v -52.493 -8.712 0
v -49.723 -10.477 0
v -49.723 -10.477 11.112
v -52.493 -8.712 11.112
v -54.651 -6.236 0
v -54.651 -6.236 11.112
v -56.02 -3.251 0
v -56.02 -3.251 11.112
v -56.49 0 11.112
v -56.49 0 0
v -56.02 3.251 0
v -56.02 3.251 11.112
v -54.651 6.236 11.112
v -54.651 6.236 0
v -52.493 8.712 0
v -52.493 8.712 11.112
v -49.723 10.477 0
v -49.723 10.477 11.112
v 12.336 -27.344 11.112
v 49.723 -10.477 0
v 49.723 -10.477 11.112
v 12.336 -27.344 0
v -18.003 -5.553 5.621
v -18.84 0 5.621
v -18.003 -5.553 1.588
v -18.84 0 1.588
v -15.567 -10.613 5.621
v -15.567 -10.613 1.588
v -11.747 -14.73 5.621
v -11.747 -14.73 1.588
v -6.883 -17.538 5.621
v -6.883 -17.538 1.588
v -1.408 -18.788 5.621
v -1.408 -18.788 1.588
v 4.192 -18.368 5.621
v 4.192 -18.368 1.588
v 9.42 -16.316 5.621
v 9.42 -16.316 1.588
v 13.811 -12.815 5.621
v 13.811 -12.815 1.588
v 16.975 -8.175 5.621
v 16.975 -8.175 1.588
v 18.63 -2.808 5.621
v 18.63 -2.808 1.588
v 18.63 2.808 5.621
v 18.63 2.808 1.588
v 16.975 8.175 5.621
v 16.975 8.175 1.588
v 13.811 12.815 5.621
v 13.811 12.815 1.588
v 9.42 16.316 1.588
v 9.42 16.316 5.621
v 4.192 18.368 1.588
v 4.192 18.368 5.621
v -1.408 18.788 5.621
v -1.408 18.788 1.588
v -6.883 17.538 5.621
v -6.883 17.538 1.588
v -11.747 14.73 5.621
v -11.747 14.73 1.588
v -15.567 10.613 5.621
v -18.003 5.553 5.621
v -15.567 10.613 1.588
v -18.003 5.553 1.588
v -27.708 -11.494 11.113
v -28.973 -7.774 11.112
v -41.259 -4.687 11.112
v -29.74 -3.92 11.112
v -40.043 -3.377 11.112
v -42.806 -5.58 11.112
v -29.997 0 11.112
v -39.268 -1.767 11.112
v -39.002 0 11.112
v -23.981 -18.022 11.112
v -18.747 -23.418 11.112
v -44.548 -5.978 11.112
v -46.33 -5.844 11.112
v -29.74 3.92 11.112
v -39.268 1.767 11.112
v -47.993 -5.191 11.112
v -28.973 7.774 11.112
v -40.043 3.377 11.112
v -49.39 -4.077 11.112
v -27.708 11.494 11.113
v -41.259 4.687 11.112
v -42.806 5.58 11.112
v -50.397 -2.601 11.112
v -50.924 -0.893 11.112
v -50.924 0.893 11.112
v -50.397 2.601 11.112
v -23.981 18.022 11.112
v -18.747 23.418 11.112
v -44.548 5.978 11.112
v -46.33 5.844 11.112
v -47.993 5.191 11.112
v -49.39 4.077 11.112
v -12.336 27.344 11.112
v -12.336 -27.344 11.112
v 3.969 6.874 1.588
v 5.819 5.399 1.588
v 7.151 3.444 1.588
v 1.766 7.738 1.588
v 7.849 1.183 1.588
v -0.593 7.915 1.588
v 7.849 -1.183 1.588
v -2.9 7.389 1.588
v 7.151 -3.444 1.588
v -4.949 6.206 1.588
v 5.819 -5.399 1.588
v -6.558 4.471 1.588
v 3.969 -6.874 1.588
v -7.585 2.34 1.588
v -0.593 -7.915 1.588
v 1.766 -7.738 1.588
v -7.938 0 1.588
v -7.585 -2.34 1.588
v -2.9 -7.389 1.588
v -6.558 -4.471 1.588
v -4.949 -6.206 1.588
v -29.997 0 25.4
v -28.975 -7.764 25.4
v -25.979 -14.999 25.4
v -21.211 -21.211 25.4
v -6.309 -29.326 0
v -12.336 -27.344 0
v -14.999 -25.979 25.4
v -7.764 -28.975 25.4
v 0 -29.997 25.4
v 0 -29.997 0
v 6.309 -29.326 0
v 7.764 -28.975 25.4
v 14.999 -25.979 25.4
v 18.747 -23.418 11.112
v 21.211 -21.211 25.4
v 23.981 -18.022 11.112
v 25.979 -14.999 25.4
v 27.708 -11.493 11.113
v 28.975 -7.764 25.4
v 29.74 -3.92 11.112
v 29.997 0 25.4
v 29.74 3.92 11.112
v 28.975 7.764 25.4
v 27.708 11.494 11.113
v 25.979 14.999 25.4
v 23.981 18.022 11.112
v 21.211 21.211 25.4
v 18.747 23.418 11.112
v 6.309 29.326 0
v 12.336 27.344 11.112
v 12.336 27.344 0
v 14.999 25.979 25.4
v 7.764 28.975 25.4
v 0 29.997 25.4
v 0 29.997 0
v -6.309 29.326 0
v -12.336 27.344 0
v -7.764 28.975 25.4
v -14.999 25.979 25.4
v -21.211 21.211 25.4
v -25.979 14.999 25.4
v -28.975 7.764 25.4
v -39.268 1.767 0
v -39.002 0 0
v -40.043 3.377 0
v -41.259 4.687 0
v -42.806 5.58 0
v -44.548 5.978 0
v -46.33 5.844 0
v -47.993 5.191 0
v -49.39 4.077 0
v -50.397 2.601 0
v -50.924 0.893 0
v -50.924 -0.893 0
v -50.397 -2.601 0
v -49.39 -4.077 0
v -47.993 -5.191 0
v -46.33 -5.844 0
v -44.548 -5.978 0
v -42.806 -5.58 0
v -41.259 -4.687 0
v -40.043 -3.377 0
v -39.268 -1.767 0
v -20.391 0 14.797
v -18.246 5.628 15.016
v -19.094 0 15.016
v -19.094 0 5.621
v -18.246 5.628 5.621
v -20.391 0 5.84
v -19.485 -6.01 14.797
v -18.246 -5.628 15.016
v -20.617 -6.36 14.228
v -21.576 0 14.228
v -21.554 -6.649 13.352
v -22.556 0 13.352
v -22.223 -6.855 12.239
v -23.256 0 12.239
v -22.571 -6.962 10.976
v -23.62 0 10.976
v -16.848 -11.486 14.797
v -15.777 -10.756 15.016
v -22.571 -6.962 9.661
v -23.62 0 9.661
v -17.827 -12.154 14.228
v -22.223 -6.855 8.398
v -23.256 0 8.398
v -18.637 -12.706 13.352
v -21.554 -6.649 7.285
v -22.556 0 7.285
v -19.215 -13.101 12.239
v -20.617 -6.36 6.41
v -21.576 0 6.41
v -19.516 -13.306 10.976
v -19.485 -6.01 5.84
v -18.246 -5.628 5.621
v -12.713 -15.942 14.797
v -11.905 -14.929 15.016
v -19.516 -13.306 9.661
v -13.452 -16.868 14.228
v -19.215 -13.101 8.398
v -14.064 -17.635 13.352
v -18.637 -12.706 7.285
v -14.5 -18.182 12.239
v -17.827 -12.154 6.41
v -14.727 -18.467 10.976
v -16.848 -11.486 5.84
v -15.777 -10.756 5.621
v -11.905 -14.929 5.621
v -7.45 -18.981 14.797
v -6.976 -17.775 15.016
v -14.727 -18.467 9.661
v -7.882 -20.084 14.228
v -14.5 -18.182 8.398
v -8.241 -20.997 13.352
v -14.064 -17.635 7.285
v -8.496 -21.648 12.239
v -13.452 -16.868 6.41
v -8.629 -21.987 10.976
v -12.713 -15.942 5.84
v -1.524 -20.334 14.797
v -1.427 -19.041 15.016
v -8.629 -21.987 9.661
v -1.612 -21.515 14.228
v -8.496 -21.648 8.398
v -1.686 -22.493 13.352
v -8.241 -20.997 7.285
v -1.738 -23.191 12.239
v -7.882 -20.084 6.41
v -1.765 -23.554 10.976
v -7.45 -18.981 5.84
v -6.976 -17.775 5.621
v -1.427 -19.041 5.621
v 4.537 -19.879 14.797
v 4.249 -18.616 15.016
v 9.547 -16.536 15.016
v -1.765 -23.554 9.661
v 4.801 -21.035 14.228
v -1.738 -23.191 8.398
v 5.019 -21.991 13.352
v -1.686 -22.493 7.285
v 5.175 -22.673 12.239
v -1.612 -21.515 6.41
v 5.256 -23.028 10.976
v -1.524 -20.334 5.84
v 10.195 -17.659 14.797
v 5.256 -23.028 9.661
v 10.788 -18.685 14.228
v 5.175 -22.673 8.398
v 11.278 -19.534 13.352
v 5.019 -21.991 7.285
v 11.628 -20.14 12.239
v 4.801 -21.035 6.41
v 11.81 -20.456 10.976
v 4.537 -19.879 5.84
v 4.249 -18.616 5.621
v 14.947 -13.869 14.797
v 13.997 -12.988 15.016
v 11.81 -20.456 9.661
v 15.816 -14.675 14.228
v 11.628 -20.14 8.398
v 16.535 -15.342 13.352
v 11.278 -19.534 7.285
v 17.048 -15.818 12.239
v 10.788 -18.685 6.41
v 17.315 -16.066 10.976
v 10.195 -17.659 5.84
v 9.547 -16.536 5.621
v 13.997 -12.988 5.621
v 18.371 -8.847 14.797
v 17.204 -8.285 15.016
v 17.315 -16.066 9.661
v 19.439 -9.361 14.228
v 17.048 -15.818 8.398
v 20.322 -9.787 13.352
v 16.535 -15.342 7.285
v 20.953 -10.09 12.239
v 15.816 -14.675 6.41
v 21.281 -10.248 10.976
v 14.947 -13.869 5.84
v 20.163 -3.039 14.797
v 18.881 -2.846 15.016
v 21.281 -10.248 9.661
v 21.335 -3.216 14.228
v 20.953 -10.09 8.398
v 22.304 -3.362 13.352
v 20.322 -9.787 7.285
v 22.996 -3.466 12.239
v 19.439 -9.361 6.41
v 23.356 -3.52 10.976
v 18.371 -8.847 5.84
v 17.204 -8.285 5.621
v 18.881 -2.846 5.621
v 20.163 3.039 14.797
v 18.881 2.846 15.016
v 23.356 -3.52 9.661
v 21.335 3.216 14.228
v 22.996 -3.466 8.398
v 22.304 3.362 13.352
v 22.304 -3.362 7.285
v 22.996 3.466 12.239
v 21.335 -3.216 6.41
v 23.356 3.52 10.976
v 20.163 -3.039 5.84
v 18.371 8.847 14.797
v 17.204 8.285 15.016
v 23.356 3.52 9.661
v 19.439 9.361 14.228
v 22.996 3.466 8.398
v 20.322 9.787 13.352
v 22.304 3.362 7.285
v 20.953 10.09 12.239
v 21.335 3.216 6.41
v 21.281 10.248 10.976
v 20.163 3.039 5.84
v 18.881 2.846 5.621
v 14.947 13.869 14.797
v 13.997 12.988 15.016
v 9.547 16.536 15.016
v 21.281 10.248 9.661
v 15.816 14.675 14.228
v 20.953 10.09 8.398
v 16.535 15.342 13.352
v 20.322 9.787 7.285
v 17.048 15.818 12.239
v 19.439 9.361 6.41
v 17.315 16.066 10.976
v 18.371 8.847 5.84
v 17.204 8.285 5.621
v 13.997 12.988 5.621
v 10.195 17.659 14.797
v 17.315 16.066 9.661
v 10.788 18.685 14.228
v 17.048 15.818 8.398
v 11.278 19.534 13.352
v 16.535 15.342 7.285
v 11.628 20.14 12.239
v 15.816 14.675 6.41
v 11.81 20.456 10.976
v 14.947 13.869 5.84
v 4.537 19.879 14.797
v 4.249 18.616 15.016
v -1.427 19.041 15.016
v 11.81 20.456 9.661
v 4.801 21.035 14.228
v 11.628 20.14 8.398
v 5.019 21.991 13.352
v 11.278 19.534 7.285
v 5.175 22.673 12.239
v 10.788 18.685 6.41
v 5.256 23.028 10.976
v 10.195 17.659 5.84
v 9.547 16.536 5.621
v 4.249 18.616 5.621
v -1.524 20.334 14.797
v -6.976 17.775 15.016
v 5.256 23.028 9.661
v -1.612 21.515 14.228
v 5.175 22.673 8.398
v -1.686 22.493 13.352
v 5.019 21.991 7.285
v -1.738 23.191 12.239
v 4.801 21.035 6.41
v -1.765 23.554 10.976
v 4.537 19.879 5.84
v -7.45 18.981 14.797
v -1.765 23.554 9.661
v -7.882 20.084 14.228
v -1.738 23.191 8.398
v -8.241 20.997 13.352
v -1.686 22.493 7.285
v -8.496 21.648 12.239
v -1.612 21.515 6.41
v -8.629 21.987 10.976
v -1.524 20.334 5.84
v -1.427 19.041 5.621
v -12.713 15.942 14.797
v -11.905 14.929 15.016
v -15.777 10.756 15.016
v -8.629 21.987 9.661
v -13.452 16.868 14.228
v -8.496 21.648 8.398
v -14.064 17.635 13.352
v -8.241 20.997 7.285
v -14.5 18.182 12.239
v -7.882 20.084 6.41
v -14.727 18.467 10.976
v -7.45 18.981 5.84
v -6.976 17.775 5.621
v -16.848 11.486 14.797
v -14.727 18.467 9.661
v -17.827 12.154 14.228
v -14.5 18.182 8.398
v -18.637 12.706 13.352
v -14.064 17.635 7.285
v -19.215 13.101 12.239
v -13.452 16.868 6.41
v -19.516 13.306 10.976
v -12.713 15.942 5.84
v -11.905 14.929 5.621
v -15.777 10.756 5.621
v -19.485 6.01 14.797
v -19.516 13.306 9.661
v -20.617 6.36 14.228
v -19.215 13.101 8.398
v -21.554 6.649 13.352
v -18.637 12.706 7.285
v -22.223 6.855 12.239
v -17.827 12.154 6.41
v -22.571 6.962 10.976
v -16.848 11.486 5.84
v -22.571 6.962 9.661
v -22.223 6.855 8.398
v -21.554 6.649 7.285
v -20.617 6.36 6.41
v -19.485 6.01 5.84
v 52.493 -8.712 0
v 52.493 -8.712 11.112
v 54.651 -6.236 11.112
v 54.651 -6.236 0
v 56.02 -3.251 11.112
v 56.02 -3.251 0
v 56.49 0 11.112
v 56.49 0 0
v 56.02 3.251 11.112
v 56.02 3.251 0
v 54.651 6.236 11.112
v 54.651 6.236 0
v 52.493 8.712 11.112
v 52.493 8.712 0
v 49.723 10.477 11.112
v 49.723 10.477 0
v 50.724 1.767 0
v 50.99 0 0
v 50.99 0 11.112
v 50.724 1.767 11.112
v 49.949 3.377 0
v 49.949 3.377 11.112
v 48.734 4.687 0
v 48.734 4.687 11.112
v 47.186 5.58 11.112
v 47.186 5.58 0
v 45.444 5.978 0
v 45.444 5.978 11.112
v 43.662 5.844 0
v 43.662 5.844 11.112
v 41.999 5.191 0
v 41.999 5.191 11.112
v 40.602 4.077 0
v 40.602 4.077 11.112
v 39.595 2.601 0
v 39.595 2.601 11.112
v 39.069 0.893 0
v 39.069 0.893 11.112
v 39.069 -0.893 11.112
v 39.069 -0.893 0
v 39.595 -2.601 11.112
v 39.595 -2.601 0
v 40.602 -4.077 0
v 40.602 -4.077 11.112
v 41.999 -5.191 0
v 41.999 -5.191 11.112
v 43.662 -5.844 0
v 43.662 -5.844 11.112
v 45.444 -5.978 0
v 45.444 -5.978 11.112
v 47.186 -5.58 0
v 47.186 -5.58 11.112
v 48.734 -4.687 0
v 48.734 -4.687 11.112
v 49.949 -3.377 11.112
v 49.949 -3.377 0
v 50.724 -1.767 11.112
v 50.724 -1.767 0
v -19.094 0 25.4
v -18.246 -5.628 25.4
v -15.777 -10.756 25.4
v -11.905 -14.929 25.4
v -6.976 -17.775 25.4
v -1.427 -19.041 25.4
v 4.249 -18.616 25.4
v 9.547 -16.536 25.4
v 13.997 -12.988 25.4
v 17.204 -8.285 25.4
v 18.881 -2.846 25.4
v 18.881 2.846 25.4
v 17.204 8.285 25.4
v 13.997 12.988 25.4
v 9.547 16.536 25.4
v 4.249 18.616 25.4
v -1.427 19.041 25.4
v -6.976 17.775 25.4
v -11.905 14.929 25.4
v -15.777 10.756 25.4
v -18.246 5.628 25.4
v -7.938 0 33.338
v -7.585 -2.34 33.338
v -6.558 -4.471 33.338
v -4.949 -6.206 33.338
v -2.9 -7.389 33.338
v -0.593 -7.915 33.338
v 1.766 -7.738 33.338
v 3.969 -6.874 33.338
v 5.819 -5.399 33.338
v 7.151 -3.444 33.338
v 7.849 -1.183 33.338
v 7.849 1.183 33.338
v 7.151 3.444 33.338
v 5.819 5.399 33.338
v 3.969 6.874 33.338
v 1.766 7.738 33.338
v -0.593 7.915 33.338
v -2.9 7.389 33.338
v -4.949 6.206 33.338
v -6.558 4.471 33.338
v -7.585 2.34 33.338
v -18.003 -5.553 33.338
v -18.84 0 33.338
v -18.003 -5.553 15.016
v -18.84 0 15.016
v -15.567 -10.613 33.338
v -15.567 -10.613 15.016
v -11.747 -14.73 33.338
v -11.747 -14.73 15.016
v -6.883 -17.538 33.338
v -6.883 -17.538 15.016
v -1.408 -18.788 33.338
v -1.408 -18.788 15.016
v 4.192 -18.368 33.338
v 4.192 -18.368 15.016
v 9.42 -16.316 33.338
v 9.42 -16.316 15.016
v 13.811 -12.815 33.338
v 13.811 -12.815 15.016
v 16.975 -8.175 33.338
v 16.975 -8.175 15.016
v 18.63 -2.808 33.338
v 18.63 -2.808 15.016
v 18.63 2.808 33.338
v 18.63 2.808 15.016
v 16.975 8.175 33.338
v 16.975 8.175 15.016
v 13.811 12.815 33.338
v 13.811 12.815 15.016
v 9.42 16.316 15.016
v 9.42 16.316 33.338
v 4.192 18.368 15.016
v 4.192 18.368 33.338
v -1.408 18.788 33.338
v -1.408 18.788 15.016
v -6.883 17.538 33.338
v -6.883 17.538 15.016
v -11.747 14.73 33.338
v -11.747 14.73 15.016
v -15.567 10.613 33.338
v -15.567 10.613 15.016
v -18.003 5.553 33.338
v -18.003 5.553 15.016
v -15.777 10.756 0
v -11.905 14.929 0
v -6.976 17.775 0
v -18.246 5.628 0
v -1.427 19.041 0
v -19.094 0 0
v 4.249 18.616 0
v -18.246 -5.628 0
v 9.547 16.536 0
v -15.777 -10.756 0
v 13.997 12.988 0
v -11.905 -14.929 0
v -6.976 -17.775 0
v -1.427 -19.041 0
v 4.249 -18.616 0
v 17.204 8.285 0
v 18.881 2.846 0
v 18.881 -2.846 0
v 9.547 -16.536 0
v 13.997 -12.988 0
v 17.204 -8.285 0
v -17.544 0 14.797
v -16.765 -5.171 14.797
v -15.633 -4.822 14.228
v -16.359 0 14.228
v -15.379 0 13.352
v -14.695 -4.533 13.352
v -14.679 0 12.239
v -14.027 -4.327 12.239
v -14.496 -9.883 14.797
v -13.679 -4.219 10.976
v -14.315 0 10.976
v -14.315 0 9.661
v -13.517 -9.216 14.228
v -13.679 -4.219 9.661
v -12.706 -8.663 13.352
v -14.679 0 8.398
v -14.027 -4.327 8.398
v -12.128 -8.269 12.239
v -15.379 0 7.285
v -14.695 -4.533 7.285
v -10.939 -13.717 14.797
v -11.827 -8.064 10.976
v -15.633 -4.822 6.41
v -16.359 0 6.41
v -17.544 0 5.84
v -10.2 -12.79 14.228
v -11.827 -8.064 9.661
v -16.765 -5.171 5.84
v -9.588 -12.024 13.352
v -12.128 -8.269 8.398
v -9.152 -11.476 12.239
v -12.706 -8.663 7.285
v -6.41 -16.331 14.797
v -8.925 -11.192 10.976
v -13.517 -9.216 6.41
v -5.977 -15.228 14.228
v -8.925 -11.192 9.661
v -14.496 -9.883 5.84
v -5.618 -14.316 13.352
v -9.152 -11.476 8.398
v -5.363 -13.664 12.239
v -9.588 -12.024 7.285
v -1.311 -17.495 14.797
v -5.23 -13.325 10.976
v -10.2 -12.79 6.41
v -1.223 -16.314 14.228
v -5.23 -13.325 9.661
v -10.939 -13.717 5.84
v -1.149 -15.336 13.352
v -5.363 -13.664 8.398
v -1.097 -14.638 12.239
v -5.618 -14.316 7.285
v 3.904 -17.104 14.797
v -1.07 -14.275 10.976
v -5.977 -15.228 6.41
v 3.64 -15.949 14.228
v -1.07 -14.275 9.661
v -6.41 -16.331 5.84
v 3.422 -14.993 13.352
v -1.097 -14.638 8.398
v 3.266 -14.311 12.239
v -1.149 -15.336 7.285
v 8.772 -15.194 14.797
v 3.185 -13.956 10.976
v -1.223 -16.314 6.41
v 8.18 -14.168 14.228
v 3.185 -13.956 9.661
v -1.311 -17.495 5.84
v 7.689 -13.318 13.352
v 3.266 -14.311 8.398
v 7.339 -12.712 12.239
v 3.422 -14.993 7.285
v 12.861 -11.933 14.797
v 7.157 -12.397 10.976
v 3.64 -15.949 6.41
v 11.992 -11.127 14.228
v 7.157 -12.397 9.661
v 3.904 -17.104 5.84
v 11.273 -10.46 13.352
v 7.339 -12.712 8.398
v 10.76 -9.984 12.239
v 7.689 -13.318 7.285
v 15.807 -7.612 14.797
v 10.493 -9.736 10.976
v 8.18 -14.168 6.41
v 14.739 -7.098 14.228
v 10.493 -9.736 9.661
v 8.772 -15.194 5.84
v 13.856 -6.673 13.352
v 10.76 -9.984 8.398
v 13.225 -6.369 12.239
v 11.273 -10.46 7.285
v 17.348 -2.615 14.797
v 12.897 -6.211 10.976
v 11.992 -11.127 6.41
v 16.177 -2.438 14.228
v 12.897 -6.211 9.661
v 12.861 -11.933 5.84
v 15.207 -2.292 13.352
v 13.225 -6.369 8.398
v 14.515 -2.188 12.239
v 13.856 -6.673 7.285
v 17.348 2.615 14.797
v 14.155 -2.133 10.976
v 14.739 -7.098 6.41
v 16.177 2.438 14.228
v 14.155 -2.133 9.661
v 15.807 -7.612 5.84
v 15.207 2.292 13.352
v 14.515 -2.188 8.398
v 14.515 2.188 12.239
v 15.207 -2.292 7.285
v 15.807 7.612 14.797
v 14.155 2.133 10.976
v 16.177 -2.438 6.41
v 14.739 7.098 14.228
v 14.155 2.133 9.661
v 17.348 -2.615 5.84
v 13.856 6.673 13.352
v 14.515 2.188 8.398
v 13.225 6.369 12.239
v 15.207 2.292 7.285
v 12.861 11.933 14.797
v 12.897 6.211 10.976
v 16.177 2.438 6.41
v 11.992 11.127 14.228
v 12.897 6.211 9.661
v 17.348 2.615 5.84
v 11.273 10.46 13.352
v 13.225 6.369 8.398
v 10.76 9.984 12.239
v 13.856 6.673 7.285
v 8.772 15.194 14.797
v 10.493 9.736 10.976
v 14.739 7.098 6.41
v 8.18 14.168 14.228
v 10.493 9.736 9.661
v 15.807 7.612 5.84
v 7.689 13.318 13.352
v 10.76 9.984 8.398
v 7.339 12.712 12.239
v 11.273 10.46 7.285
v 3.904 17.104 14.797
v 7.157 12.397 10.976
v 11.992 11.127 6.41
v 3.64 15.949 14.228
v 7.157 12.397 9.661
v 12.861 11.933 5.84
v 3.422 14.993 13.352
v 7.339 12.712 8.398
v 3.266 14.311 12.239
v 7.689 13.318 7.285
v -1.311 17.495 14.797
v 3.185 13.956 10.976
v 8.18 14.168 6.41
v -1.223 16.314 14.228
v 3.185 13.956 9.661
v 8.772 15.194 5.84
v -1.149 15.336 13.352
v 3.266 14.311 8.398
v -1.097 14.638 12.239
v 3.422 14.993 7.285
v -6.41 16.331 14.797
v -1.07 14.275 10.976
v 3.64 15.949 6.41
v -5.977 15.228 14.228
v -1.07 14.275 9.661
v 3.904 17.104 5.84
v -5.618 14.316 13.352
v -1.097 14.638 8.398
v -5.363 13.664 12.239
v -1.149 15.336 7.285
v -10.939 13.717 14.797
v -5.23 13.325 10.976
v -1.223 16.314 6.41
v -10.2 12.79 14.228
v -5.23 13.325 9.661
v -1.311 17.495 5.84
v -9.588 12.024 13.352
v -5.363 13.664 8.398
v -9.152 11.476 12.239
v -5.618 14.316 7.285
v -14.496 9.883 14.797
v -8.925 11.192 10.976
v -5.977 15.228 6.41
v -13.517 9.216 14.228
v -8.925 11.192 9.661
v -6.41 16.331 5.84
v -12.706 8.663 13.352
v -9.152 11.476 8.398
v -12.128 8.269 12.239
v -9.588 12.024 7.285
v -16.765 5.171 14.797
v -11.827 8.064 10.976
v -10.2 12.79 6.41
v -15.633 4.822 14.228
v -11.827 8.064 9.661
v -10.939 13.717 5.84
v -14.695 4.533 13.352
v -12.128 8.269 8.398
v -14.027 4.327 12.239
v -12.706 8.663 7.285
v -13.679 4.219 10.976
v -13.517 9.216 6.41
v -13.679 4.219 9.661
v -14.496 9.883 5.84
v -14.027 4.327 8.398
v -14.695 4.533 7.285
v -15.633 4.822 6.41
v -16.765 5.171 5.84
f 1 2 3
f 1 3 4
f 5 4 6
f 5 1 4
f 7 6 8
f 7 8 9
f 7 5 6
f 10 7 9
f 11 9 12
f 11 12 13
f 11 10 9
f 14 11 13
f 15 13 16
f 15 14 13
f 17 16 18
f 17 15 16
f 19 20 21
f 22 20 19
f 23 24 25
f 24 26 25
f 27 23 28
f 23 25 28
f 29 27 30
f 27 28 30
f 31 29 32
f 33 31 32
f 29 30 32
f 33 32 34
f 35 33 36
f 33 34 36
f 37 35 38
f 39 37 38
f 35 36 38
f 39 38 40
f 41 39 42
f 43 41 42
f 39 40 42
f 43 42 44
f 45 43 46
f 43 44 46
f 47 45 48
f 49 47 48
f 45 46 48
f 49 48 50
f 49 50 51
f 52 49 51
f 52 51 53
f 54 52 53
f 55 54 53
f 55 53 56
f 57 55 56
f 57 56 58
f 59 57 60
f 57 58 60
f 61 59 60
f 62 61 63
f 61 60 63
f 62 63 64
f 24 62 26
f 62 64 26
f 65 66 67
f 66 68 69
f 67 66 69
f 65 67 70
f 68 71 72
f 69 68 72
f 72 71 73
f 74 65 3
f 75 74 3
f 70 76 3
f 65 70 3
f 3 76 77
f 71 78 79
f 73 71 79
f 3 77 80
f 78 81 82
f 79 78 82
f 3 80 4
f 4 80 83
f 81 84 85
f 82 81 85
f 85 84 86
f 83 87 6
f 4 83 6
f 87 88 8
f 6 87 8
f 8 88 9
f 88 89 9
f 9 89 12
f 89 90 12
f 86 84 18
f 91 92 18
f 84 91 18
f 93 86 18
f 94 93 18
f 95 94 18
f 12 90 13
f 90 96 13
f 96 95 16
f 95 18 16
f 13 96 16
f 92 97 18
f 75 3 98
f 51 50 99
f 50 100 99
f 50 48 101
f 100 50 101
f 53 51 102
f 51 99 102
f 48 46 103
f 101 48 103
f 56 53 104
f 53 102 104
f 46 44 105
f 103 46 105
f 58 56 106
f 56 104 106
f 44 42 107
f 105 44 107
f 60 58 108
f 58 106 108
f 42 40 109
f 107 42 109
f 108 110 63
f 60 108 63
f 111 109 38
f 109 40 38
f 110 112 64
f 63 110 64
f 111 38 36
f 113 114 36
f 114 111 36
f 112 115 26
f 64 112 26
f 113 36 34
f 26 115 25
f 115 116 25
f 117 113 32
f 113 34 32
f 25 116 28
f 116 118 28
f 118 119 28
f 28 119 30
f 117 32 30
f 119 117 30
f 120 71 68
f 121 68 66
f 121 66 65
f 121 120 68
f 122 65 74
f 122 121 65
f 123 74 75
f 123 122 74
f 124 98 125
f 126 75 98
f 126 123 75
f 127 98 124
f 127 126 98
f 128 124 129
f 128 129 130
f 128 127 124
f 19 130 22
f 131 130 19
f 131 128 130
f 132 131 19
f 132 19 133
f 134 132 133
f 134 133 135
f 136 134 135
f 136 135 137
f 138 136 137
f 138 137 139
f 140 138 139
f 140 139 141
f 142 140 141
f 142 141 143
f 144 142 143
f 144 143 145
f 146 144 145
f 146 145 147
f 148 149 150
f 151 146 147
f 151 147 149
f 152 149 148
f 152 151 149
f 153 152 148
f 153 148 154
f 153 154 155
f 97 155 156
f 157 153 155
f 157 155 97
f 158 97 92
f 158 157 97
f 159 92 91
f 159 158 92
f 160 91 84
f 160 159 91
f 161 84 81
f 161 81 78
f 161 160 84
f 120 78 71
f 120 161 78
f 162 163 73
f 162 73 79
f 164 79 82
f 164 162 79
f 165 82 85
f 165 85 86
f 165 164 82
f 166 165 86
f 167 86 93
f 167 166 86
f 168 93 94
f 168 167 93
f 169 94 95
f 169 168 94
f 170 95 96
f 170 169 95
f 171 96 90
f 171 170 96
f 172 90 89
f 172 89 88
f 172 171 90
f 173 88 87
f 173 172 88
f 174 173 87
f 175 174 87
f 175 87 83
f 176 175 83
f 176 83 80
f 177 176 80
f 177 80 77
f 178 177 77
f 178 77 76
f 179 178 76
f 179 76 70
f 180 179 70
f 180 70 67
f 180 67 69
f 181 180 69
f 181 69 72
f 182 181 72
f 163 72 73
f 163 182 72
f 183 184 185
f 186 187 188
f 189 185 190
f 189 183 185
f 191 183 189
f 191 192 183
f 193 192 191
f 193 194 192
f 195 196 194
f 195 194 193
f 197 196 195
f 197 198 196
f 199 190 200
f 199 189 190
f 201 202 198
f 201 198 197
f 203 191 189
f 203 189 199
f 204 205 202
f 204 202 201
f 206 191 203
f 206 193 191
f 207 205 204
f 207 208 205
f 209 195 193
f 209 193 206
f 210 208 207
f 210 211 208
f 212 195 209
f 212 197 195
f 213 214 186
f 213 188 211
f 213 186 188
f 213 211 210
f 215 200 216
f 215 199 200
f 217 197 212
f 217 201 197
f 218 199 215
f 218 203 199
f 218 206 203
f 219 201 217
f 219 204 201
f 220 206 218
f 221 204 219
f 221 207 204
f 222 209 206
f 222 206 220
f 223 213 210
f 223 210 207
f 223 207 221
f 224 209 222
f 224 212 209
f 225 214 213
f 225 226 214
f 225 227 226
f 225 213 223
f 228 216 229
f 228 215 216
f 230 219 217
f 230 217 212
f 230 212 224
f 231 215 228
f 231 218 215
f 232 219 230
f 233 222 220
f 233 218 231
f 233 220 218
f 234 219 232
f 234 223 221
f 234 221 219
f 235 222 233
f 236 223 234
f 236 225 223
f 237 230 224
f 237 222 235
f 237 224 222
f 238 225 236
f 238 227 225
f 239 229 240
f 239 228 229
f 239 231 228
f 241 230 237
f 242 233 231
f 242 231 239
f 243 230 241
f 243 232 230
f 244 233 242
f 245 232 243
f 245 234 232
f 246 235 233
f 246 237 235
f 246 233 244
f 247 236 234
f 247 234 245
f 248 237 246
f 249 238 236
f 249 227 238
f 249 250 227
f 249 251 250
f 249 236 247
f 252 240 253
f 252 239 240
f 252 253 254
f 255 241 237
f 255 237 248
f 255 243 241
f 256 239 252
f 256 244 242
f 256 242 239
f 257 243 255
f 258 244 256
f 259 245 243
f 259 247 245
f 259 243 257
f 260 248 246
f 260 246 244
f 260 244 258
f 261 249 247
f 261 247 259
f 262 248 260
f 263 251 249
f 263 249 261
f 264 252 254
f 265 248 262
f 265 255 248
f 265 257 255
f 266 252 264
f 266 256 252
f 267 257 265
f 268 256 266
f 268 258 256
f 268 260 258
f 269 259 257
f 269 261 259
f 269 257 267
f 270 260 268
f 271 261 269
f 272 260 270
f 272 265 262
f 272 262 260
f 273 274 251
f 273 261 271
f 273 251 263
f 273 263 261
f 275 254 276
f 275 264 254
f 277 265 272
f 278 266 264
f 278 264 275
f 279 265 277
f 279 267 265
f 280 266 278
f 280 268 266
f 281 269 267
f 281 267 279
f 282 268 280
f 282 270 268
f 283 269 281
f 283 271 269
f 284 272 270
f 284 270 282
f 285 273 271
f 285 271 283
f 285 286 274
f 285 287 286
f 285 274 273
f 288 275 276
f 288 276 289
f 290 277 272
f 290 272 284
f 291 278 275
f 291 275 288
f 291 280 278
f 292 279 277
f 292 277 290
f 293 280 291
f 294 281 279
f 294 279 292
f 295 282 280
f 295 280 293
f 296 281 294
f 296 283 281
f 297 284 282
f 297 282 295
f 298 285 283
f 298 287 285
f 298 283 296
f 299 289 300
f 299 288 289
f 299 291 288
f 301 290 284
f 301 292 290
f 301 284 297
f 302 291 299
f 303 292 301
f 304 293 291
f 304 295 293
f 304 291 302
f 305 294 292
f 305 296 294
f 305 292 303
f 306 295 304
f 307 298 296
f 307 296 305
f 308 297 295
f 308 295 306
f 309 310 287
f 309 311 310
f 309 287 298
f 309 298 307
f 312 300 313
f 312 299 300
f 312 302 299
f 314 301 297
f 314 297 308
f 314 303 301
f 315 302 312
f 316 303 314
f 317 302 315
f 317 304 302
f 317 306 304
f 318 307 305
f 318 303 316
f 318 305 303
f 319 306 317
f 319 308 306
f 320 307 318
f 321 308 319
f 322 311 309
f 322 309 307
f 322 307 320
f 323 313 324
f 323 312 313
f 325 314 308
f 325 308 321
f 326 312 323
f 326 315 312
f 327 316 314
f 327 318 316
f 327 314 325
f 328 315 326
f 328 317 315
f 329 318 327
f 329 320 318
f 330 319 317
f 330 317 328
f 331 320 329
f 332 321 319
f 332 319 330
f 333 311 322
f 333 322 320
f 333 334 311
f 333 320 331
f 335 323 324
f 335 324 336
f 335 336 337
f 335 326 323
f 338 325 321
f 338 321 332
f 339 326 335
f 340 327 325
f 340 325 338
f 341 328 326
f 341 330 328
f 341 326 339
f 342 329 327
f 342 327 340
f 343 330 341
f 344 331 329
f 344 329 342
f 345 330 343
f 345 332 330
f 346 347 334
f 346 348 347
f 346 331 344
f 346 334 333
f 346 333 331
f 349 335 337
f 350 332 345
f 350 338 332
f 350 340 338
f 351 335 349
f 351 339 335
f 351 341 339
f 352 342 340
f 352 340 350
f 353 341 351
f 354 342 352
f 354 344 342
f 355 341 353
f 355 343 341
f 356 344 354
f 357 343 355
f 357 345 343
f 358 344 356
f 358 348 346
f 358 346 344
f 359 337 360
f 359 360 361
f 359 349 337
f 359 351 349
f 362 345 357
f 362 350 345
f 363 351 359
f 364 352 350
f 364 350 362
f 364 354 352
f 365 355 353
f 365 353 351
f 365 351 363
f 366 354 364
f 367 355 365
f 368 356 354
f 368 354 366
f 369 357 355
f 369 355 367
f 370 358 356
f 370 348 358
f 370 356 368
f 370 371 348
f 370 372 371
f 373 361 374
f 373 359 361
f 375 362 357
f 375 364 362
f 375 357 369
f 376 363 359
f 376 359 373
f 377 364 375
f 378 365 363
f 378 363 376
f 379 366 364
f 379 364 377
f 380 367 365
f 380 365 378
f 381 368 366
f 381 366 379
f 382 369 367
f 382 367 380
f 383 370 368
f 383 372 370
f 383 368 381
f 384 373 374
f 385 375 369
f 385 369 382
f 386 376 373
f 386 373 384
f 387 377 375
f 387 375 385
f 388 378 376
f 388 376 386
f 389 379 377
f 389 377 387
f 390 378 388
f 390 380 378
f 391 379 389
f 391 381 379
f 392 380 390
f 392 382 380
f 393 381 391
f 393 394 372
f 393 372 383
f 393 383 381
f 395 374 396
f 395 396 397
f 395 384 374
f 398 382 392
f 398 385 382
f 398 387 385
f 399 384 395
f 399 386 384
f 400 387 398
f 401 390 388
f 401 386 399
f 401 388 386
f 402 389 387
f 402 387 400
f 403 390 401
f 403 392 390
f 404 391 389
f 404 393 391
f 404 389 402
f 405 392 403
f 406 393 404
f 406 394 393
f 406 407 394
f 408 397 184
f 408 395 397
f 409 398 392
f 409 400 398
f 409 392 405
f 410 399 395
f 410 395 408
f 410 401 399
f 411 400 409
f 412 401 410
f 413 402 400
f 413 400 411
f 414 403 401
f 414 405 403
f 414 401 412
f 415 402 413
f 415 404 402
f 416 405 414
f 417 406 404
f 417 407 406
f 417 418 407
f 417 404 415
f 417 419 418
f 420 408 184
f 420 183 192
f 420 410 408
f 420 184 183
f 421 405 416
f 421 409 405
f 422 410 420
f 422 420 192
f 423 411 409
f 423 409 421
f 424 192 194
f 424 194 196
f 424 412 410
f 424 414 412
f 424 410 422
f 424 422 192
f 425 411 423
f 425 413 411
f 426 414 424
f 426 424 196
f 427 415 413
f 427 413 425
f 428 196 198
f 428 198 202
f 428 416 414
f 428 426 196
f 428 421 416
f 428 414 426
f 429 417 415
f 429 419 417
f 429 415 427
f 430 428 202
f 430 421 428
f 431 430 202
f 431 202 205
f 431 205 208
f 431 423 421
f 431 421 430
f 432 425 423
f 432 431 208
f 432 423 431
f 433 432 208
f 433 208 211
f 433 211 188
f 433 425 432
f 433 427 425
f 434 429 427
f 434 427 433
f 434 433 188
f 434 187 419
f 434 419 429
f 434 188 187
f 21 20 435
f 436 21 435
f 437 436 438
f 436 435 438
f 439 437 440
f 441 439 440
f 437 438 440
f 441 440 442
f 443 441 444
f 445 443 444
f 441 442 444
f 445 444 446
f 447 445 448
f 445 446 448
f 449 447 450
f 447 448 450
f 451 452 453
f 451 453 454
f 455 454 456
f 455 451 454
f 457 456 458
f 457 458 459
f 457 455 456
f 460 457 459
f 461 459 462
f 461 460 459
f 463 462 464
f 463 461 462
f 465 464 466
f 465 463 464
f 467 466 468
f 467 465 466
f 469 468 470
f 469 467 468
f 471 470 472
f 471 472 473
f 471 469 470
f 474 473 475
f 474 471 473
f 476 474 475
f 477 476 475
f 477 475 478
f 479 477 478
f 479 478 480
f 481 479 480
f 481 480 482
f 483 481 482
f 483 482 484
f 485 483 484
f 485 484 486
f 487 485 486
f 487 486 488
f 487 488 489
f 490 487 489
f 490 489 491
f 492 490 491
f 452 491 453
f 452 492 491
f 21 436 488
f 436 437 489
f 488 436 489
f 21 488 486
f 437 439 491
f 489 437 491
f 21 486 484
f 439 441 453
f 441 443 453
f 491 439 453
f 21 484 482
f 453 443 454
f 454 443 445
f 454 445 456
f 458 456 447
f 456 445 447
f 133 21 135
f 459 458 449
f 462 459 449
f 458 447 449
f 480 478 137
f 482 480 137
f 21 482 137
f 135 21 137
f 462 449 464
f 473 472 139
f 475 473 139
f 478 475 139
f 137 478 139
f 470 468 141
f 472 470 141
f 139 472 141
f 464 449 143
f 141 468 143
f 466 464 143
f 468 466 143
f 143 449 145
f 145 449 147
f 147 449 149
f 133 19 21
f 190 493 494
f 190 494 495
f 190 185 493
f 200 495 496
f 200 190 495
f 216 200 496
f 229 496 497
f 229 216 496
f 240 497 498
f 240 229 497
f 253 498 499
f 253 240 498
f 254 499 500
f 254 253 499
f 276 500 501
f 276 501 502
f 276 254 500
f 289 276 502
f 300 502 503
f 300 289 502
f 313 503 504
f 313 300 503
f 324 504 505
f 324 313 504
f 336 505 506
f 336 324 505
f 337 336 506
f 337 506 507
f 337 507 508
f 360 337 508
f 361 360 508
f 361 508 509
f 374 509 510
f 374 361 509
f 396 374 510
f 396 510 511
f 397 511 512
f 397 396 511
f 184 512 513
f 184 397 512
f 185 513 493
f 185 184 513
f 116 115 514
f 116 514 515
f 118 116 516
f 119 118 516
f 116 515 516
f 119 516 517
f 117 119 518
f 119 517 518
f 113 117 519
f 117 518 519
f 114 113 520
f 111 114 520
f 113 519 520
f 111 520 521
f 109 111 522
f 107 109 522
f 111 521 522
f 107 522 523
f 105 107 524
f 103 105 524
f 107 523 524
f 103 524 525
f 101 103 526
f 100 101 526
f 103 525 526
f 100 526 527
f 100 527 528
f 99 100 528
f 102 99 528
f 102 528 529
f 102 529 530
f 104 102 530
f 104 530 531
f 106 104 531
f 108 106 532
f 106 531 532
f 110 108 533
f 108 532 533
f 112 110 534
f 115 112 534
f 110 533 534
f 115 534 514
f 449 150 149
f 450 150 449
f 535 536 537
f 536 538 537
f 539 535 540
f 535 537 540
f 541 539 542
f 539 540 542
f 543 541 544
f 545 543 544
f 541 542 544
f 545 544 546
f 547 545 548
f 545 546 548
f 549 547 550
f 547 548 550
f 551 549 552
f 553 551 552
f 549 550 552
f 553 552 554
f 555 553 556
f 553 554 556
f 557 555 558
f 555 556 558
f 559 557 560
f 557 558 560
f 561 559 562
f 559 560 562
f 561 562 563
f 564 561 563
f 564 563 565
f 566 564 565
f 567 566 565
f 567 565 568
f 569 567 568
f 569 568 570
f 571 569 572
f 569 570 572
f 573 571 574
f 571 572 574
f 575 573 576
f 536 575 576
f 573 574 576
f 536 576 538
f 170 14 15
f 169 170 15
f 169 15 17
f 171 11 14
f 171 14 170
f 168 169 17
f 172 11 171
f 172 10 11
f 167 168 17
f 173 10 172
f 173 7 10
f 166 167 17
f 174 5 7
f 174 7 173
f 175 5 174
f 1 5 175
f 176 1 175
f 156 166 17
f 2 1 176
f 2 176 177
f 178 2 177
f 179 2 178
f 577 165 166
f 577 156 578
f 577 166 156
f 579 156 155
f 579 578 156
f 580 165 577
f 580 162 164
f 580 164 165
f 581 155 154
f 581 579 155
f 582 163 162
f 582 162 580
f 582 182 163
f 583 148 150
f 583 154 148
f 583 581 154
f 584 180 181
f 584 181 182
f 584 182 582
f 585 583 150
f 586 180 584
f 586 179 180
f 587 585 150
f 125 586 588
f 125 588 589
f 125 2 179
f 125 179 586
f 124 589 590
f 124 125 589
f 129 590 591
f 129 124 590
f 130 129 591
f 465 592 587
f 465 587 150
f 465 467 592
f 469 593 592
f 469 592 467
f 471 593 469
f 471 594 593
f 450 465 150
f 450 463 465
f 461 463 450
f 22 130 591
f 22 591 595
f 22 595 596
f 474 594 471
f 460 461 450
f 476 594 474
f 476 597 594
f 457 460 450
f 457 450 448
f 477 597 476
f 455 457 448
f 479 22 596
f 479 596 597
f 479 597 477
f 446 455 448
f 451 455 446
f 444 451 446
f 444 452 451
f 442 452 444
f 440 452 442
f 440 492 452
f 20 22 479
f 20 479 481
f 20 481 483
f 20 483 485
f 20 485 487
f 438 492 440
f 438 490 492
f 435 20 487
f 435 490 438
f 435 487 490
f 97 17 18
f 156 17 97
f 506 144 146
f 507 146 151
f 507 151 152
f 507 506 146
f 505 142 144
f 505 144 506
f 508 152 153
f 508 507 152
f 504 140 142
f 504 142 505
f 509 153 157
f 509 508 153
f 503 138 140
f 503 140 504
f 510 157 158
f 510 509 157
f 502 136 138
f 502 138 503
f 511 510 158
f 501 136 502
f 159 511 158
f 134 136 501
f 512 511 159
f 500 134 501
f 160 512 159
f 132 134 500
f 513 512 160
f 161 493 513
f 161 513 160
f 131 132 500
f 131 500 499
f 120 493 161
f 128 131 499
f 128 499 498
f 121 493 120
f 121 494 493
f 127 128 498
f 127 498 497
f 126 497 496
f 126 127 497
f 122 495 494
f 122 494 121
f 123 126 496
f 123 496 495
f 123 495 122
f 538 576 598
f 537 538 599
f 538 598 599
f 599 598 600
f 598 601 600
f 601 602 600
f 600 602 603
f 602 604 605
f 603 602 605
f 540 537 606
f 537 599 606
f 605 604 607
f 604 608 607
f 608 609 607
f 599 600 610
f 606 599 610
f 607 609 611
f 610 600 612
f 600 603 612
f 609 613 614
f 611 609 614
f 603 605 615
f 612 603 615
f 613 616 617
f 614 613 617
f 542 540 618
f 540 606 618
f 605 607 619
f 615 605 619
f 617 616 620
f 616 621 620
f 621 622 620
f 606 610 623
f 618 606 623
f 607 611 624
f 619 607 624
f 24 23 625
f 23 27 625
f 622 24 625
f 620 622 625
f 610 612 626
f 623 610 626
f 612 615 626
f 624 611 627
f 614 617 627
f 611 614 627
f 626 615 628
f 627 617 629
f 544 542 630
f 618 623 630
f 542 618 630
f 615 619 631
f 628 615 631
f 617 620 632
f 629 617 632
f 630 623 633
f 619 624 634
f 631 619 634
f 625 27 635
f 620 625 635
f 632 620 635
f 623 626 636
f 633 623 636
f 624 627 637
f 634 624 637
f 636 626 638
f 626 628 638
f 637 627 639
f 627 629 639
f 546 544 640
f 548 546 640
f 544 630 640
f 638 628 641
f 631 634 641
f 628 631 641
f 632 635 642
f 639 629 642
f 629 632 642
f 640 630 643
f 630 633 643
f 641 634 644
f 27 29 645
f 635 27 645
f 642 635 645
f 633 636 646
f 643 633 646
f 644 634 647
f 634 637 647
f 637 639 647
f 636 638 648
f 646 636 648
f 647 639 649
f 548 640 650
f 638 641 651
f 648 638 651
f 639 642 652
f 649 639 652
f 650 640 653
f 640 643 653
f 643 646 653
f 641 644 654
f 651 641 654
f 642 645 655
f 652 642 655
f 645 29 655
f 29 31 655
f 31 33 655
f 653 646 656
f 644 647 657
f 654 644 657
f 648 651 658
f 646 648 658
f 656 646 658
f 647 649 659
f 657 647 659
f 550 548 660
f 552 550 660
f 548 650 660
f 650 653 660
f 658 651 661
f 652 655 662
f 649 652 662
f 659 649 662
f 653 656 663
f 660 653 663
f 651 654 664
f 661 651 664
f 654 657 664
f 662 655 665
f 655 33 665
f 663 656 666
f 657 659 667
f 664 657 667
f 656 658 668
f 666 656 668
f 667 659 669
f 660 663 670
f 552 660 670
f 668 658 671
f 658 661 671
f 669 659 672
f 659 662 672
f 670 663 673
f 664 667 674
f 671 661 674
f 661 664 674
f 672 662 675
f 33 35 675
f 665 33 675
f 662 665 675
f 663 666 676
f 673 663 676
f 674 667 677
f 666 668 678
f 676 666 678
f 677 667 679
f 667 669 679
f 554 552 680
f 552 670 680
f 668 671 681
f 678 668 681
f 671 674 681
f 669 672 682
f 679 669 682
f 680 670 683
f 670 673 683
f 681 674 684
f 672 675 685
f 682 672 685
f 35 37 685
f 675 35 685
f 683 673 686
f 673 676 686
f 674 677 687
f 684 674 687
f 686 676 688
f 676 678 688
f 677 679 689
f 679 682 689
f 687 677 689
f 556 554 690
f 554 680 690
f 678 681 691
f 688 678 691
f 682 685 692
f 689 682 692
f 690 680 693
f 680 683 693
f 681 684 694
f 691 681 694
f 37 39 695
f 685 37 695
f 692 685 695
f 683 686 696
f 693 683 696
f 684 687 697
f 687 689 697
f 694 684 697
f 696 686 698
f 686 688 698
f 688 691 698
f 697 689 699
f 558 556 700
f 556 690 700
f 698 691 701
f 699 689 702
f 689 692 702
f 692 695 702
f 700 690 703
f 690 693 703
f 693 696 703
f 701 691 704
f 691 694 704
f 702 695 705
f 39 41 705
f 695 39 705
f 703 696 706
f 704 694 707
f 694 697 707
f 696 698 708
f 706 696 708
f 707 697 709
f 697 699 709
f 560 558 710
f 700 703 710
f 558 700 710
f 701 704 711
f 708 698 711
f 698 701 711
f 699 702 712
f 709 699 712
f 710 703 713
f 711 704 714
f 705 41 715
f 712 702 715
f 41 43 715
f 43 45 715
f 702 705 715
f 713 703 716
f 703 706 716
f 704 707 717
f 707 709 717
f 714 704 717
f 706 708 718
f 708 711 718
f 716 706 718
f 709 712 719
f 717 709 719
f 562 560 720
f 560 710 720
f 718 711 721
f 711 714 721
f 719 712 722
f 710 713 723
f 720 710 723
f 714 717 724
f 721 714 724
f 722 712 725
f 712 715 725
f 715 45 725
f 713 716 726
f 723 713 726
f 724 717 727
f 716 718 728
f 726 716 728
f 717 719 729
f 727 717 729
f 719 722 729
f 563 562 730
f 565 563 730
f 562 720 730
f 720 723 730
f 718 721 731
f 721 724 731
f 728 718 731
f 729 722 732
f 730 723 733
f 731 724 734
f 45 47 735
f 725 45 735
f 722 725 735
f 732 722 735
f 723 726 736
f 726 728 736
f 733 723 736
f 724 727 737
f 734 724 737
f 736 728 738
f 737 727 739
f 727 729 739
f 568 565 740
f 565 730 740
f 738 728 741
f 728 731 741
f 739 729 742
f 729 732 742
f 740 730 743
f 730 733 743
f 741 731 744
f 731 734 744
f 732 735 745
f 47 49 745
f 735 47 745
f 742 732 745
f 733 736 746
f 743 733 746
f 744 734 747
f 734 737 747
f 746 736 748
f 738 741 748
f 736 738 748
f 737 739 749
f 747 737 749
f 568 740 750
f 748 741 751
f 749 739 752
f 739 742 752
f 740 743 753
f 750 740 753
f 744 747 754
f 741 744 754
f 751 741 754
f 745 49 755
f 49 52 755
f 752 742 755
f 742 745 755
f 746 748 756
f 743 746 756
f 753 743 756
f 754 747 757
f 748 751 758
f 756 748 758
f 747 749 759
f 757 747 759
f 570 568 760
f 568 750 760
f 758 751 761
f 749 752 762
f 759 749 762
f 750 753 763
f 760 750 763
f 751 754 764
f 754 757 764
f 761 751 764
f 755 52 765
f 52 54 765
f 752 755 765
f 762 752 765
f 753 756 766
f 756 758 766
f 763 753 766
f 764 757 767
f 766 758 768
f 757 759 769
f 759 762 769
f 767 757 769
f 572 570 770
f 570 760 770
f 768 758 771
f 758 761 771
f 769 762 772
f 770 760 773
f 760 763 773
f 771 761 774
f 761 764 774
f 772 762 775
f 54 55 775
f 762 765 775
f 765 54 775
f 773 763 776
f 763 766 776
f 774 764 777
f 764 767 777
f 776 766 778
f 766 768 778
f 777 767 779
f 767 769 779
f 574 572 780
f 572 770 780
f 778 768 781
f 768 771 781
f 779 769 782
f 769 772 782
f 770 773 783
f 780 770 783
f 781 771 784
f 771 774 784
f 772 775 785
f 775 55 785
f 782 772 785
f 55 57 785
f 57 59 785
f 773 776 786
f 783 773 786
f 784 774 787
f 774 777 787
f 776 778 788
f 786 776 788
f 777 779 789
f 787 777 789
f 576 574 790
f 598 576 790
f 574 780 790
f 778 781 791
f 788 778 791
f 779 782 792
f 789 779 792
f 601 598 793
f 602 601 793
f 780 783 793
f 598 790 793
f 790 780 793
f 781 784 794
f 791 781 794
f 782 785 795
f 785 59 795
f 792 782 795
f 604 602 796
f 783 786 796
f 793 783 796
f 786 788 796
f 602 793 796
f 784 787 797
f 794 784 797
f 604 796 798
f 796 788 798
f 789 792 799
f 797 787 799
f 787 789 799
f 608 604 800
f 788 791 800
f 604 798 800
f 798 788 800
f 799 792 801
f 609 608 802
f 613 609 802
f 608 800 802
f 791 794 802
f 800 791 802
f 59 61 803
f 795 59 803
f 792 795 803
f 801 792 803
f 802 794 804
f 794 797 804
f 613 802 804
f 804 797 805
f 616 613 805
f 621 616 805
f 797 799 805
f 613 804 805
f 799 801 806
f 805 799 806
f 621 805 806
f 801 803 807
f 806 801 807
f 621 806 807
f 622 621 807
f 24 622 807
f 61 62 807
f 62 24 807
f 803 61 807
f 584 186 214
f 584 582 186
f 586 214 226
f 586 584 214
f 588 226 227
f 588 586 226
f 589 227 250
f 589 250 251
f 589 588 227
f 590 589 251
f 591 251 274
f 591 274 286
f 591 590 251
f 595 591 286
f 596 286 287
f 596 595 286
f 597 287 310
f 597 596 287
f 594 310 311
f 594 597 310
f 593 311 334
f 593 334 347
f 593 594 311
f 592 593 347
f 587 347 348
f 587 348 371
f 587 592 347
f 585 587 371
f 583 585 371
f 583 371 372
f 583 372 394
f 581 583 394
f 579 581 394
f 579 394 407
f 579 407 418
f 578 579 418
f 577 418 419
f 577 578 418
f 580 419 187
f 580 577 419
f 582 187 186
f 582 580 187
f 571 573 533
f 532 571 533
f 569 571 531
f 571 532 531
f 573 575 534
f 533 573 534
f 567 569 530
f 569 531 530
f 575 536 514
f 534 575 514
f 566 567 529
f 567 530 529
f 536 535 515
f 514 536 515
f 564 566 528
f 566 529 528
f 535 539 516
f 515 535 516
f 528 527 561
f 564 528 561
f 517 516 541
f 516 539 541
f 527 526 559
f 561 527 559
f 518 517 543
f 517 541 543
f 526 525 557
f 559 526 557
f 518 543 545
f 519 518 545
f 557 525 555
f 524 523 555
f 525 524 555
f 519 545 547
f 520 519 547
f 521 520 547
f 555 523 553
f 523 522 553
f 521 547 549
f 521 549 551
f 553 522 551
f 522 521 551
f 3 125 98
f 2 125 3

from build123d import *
from build123d.topology import SkipClean

# Parameters (mm, degrees)
SKETCH1_R        = 5.9944
EXTRUDE1_DEPTH   = 11.1125
EXTRUDE1_2_DEPTH = 11.1125
EXTRUDE2_DEPTH   = 11.1125


with BuildPart() as part:
    # Sketch1 → Extrude1 (new body)
    with BuildSketch(Plane.XY):
        with BuildLine():
            Line((-44.9961, 11.4935), (-27.708184071, 11.4935))
            ThreePointArc((-27.708184071, 11.4935), (-29.9974, 0), (-27.708184071, -11.4935))
            Line((-27.708184071, -11.4935), (-44.9961, -11.4935))
            ThreePointArc((-44.9961, -11.4935), (-56.4896, 0), (-44.9961, 11.4935))
        make_face()
        with Locations((-44.9961, 0)):
            Circle(SKETCH1_R, mode=Mode.SUBTRACT)
    extrude(amount=EXTRUDE1_DEPTH)



with BuildPart() as body_2:
    # Sketch1 → Extrude1 2 (new body)
    with BuildSketch(Plane.XY):
        with BuildLine():
            Line((44.9961, 11.4935), (27.708184071, 11.4935))
            ThreePointArc((27.708184071, 11.4935), (29.9974, 0), (27.708184071, -11.4935))
            Line((27.708184071, -11.4935), (44.9961, -11.4935))
            ThreePointArc((44.9961, -11.4935), (56.4896, 0), (44.9961, 11.4935))
        make_face()
        with Locations((44.9961, 0)):
            Circle(SKETCH1_R, mode=Mode.SUBTRACT)
    extrude(amount=EXTRUDE1_2_DEPTH)


with BuildPart() as part_1:
    with SkipClean():  # the faces are left unmerged after this step: merging them gives an invalid solid
        add(part.part)

        add(body_2.part)  # Extrude2 merges body 2
        # Sketch2 → Extrude2 (add)
        with BuildSketch(Plane.XY):
            with BuildLine():
                Line((-49.72261129, 10.476670906), (-12.335933333, 27.343532244))
                ThreePointArc((-12.335933333, 27.343532244), (-21.533432499, 20.884331245), (-27.708184071, 11.4935))
                Line((-27.708184071, 11.4935), (-44.9961, 11.4935))
                ThreePointArc((-44.9961, 11.4935), (-47.413425505, 11.236417563), (-49.72261129, 10.476670906))
            make_face()
            with BuildLine():
                Line((-44.9961, -11.4935), (-27.708184071, -11.4935))
                ThreePointArc((-27.708184071, -11.4935), (-21.533432499, -20.884331245), (-12.335933333, -27.343532244))
                Line((-12.335933333, -27.343532244), (-49.72261129, -10.476670906))
                ThreePointArc((-49.72261129, -10.476670906), (-47.413425505, -11.236417563), (-44.9961, -11.4935))
            make_face()
            with BuildLine():
                Line((12.335933333, 27.343532244), (49.72261129, 10.476670906))
                ThreePointArc((49.72261129, 10.476670906), (47.413425505, 11.236417563), (44.9961, 11.4935))
                Line((44.9961, 11.4935), (27.708184071, 11.4935))
                ThreePointArc((27.708184071, 11.4935), (21.533432499, 20.884331245), (12.335933333, 27.343532244))
            make_face()
            with BuildLine():
                Line((49.72261129, -10.476670906), (12.335933333, -27.343532244))
                ThreePointArc((12.335933333, -27.343532244), (21.533432499, -20.884331245), (27.708184071, -11.4935))
                Line((27.708184071, -11.4935), (44.9961, -11.4935))
                ThreePointArc((44.9961, -11.4935), (47.413425505, -11.236417563), (49.72261129, -10.476670906))
            make_face()
        extrude(amount=EXTRUDE2_DEPTH)

    # Sketch3 → Revolve1 (revolve)
    with BuildSketch(Plane(origin=(0, 0, 0), x_dir=(0, 0, -1), z_dir=(1, 0, 0))):
        with BuildLine():
            Line((0, 29.9974), (-25.4, 29.9974))
            Line((-25.4, 29.9974), (-25.4, 19.09445))
            Line((-25.4, 19.09445), (-15.01603347, 19.09445))
            ThreePointArc((-15.01603347, 19.09445), (-10.31875, 23.66645), (-5.62146653, 19.09445))
            Line((-5.62146653, 19.09445), (0, 19.09445))
            Line((0, 19.09445), (0, 29.9974))
        make_face()
        with BuildLine():
            Line((-33.3375, 18.84045), (-15.01603347, 18.84045))
            ThreePointArc((-15.01603347, 18.84045), (-10.31875, 14.26845), (-5.62146653, 18.84045))
            Line((-5.62146653, 18.84045), (-1.5875, 18.84045))
            Line((-1.5875, 18.84045), (-1.5875, 7.9375))
            Line((-1.5875, 7.9375), (-33.3375, 7.9375))
            Line((-33.3375, 7.9375), (-33.3375, 18.84045))
        make_face()
    revolve(axis=Axis((0, 0, 0), (0, 0, 1)))


solid = part_1.part
